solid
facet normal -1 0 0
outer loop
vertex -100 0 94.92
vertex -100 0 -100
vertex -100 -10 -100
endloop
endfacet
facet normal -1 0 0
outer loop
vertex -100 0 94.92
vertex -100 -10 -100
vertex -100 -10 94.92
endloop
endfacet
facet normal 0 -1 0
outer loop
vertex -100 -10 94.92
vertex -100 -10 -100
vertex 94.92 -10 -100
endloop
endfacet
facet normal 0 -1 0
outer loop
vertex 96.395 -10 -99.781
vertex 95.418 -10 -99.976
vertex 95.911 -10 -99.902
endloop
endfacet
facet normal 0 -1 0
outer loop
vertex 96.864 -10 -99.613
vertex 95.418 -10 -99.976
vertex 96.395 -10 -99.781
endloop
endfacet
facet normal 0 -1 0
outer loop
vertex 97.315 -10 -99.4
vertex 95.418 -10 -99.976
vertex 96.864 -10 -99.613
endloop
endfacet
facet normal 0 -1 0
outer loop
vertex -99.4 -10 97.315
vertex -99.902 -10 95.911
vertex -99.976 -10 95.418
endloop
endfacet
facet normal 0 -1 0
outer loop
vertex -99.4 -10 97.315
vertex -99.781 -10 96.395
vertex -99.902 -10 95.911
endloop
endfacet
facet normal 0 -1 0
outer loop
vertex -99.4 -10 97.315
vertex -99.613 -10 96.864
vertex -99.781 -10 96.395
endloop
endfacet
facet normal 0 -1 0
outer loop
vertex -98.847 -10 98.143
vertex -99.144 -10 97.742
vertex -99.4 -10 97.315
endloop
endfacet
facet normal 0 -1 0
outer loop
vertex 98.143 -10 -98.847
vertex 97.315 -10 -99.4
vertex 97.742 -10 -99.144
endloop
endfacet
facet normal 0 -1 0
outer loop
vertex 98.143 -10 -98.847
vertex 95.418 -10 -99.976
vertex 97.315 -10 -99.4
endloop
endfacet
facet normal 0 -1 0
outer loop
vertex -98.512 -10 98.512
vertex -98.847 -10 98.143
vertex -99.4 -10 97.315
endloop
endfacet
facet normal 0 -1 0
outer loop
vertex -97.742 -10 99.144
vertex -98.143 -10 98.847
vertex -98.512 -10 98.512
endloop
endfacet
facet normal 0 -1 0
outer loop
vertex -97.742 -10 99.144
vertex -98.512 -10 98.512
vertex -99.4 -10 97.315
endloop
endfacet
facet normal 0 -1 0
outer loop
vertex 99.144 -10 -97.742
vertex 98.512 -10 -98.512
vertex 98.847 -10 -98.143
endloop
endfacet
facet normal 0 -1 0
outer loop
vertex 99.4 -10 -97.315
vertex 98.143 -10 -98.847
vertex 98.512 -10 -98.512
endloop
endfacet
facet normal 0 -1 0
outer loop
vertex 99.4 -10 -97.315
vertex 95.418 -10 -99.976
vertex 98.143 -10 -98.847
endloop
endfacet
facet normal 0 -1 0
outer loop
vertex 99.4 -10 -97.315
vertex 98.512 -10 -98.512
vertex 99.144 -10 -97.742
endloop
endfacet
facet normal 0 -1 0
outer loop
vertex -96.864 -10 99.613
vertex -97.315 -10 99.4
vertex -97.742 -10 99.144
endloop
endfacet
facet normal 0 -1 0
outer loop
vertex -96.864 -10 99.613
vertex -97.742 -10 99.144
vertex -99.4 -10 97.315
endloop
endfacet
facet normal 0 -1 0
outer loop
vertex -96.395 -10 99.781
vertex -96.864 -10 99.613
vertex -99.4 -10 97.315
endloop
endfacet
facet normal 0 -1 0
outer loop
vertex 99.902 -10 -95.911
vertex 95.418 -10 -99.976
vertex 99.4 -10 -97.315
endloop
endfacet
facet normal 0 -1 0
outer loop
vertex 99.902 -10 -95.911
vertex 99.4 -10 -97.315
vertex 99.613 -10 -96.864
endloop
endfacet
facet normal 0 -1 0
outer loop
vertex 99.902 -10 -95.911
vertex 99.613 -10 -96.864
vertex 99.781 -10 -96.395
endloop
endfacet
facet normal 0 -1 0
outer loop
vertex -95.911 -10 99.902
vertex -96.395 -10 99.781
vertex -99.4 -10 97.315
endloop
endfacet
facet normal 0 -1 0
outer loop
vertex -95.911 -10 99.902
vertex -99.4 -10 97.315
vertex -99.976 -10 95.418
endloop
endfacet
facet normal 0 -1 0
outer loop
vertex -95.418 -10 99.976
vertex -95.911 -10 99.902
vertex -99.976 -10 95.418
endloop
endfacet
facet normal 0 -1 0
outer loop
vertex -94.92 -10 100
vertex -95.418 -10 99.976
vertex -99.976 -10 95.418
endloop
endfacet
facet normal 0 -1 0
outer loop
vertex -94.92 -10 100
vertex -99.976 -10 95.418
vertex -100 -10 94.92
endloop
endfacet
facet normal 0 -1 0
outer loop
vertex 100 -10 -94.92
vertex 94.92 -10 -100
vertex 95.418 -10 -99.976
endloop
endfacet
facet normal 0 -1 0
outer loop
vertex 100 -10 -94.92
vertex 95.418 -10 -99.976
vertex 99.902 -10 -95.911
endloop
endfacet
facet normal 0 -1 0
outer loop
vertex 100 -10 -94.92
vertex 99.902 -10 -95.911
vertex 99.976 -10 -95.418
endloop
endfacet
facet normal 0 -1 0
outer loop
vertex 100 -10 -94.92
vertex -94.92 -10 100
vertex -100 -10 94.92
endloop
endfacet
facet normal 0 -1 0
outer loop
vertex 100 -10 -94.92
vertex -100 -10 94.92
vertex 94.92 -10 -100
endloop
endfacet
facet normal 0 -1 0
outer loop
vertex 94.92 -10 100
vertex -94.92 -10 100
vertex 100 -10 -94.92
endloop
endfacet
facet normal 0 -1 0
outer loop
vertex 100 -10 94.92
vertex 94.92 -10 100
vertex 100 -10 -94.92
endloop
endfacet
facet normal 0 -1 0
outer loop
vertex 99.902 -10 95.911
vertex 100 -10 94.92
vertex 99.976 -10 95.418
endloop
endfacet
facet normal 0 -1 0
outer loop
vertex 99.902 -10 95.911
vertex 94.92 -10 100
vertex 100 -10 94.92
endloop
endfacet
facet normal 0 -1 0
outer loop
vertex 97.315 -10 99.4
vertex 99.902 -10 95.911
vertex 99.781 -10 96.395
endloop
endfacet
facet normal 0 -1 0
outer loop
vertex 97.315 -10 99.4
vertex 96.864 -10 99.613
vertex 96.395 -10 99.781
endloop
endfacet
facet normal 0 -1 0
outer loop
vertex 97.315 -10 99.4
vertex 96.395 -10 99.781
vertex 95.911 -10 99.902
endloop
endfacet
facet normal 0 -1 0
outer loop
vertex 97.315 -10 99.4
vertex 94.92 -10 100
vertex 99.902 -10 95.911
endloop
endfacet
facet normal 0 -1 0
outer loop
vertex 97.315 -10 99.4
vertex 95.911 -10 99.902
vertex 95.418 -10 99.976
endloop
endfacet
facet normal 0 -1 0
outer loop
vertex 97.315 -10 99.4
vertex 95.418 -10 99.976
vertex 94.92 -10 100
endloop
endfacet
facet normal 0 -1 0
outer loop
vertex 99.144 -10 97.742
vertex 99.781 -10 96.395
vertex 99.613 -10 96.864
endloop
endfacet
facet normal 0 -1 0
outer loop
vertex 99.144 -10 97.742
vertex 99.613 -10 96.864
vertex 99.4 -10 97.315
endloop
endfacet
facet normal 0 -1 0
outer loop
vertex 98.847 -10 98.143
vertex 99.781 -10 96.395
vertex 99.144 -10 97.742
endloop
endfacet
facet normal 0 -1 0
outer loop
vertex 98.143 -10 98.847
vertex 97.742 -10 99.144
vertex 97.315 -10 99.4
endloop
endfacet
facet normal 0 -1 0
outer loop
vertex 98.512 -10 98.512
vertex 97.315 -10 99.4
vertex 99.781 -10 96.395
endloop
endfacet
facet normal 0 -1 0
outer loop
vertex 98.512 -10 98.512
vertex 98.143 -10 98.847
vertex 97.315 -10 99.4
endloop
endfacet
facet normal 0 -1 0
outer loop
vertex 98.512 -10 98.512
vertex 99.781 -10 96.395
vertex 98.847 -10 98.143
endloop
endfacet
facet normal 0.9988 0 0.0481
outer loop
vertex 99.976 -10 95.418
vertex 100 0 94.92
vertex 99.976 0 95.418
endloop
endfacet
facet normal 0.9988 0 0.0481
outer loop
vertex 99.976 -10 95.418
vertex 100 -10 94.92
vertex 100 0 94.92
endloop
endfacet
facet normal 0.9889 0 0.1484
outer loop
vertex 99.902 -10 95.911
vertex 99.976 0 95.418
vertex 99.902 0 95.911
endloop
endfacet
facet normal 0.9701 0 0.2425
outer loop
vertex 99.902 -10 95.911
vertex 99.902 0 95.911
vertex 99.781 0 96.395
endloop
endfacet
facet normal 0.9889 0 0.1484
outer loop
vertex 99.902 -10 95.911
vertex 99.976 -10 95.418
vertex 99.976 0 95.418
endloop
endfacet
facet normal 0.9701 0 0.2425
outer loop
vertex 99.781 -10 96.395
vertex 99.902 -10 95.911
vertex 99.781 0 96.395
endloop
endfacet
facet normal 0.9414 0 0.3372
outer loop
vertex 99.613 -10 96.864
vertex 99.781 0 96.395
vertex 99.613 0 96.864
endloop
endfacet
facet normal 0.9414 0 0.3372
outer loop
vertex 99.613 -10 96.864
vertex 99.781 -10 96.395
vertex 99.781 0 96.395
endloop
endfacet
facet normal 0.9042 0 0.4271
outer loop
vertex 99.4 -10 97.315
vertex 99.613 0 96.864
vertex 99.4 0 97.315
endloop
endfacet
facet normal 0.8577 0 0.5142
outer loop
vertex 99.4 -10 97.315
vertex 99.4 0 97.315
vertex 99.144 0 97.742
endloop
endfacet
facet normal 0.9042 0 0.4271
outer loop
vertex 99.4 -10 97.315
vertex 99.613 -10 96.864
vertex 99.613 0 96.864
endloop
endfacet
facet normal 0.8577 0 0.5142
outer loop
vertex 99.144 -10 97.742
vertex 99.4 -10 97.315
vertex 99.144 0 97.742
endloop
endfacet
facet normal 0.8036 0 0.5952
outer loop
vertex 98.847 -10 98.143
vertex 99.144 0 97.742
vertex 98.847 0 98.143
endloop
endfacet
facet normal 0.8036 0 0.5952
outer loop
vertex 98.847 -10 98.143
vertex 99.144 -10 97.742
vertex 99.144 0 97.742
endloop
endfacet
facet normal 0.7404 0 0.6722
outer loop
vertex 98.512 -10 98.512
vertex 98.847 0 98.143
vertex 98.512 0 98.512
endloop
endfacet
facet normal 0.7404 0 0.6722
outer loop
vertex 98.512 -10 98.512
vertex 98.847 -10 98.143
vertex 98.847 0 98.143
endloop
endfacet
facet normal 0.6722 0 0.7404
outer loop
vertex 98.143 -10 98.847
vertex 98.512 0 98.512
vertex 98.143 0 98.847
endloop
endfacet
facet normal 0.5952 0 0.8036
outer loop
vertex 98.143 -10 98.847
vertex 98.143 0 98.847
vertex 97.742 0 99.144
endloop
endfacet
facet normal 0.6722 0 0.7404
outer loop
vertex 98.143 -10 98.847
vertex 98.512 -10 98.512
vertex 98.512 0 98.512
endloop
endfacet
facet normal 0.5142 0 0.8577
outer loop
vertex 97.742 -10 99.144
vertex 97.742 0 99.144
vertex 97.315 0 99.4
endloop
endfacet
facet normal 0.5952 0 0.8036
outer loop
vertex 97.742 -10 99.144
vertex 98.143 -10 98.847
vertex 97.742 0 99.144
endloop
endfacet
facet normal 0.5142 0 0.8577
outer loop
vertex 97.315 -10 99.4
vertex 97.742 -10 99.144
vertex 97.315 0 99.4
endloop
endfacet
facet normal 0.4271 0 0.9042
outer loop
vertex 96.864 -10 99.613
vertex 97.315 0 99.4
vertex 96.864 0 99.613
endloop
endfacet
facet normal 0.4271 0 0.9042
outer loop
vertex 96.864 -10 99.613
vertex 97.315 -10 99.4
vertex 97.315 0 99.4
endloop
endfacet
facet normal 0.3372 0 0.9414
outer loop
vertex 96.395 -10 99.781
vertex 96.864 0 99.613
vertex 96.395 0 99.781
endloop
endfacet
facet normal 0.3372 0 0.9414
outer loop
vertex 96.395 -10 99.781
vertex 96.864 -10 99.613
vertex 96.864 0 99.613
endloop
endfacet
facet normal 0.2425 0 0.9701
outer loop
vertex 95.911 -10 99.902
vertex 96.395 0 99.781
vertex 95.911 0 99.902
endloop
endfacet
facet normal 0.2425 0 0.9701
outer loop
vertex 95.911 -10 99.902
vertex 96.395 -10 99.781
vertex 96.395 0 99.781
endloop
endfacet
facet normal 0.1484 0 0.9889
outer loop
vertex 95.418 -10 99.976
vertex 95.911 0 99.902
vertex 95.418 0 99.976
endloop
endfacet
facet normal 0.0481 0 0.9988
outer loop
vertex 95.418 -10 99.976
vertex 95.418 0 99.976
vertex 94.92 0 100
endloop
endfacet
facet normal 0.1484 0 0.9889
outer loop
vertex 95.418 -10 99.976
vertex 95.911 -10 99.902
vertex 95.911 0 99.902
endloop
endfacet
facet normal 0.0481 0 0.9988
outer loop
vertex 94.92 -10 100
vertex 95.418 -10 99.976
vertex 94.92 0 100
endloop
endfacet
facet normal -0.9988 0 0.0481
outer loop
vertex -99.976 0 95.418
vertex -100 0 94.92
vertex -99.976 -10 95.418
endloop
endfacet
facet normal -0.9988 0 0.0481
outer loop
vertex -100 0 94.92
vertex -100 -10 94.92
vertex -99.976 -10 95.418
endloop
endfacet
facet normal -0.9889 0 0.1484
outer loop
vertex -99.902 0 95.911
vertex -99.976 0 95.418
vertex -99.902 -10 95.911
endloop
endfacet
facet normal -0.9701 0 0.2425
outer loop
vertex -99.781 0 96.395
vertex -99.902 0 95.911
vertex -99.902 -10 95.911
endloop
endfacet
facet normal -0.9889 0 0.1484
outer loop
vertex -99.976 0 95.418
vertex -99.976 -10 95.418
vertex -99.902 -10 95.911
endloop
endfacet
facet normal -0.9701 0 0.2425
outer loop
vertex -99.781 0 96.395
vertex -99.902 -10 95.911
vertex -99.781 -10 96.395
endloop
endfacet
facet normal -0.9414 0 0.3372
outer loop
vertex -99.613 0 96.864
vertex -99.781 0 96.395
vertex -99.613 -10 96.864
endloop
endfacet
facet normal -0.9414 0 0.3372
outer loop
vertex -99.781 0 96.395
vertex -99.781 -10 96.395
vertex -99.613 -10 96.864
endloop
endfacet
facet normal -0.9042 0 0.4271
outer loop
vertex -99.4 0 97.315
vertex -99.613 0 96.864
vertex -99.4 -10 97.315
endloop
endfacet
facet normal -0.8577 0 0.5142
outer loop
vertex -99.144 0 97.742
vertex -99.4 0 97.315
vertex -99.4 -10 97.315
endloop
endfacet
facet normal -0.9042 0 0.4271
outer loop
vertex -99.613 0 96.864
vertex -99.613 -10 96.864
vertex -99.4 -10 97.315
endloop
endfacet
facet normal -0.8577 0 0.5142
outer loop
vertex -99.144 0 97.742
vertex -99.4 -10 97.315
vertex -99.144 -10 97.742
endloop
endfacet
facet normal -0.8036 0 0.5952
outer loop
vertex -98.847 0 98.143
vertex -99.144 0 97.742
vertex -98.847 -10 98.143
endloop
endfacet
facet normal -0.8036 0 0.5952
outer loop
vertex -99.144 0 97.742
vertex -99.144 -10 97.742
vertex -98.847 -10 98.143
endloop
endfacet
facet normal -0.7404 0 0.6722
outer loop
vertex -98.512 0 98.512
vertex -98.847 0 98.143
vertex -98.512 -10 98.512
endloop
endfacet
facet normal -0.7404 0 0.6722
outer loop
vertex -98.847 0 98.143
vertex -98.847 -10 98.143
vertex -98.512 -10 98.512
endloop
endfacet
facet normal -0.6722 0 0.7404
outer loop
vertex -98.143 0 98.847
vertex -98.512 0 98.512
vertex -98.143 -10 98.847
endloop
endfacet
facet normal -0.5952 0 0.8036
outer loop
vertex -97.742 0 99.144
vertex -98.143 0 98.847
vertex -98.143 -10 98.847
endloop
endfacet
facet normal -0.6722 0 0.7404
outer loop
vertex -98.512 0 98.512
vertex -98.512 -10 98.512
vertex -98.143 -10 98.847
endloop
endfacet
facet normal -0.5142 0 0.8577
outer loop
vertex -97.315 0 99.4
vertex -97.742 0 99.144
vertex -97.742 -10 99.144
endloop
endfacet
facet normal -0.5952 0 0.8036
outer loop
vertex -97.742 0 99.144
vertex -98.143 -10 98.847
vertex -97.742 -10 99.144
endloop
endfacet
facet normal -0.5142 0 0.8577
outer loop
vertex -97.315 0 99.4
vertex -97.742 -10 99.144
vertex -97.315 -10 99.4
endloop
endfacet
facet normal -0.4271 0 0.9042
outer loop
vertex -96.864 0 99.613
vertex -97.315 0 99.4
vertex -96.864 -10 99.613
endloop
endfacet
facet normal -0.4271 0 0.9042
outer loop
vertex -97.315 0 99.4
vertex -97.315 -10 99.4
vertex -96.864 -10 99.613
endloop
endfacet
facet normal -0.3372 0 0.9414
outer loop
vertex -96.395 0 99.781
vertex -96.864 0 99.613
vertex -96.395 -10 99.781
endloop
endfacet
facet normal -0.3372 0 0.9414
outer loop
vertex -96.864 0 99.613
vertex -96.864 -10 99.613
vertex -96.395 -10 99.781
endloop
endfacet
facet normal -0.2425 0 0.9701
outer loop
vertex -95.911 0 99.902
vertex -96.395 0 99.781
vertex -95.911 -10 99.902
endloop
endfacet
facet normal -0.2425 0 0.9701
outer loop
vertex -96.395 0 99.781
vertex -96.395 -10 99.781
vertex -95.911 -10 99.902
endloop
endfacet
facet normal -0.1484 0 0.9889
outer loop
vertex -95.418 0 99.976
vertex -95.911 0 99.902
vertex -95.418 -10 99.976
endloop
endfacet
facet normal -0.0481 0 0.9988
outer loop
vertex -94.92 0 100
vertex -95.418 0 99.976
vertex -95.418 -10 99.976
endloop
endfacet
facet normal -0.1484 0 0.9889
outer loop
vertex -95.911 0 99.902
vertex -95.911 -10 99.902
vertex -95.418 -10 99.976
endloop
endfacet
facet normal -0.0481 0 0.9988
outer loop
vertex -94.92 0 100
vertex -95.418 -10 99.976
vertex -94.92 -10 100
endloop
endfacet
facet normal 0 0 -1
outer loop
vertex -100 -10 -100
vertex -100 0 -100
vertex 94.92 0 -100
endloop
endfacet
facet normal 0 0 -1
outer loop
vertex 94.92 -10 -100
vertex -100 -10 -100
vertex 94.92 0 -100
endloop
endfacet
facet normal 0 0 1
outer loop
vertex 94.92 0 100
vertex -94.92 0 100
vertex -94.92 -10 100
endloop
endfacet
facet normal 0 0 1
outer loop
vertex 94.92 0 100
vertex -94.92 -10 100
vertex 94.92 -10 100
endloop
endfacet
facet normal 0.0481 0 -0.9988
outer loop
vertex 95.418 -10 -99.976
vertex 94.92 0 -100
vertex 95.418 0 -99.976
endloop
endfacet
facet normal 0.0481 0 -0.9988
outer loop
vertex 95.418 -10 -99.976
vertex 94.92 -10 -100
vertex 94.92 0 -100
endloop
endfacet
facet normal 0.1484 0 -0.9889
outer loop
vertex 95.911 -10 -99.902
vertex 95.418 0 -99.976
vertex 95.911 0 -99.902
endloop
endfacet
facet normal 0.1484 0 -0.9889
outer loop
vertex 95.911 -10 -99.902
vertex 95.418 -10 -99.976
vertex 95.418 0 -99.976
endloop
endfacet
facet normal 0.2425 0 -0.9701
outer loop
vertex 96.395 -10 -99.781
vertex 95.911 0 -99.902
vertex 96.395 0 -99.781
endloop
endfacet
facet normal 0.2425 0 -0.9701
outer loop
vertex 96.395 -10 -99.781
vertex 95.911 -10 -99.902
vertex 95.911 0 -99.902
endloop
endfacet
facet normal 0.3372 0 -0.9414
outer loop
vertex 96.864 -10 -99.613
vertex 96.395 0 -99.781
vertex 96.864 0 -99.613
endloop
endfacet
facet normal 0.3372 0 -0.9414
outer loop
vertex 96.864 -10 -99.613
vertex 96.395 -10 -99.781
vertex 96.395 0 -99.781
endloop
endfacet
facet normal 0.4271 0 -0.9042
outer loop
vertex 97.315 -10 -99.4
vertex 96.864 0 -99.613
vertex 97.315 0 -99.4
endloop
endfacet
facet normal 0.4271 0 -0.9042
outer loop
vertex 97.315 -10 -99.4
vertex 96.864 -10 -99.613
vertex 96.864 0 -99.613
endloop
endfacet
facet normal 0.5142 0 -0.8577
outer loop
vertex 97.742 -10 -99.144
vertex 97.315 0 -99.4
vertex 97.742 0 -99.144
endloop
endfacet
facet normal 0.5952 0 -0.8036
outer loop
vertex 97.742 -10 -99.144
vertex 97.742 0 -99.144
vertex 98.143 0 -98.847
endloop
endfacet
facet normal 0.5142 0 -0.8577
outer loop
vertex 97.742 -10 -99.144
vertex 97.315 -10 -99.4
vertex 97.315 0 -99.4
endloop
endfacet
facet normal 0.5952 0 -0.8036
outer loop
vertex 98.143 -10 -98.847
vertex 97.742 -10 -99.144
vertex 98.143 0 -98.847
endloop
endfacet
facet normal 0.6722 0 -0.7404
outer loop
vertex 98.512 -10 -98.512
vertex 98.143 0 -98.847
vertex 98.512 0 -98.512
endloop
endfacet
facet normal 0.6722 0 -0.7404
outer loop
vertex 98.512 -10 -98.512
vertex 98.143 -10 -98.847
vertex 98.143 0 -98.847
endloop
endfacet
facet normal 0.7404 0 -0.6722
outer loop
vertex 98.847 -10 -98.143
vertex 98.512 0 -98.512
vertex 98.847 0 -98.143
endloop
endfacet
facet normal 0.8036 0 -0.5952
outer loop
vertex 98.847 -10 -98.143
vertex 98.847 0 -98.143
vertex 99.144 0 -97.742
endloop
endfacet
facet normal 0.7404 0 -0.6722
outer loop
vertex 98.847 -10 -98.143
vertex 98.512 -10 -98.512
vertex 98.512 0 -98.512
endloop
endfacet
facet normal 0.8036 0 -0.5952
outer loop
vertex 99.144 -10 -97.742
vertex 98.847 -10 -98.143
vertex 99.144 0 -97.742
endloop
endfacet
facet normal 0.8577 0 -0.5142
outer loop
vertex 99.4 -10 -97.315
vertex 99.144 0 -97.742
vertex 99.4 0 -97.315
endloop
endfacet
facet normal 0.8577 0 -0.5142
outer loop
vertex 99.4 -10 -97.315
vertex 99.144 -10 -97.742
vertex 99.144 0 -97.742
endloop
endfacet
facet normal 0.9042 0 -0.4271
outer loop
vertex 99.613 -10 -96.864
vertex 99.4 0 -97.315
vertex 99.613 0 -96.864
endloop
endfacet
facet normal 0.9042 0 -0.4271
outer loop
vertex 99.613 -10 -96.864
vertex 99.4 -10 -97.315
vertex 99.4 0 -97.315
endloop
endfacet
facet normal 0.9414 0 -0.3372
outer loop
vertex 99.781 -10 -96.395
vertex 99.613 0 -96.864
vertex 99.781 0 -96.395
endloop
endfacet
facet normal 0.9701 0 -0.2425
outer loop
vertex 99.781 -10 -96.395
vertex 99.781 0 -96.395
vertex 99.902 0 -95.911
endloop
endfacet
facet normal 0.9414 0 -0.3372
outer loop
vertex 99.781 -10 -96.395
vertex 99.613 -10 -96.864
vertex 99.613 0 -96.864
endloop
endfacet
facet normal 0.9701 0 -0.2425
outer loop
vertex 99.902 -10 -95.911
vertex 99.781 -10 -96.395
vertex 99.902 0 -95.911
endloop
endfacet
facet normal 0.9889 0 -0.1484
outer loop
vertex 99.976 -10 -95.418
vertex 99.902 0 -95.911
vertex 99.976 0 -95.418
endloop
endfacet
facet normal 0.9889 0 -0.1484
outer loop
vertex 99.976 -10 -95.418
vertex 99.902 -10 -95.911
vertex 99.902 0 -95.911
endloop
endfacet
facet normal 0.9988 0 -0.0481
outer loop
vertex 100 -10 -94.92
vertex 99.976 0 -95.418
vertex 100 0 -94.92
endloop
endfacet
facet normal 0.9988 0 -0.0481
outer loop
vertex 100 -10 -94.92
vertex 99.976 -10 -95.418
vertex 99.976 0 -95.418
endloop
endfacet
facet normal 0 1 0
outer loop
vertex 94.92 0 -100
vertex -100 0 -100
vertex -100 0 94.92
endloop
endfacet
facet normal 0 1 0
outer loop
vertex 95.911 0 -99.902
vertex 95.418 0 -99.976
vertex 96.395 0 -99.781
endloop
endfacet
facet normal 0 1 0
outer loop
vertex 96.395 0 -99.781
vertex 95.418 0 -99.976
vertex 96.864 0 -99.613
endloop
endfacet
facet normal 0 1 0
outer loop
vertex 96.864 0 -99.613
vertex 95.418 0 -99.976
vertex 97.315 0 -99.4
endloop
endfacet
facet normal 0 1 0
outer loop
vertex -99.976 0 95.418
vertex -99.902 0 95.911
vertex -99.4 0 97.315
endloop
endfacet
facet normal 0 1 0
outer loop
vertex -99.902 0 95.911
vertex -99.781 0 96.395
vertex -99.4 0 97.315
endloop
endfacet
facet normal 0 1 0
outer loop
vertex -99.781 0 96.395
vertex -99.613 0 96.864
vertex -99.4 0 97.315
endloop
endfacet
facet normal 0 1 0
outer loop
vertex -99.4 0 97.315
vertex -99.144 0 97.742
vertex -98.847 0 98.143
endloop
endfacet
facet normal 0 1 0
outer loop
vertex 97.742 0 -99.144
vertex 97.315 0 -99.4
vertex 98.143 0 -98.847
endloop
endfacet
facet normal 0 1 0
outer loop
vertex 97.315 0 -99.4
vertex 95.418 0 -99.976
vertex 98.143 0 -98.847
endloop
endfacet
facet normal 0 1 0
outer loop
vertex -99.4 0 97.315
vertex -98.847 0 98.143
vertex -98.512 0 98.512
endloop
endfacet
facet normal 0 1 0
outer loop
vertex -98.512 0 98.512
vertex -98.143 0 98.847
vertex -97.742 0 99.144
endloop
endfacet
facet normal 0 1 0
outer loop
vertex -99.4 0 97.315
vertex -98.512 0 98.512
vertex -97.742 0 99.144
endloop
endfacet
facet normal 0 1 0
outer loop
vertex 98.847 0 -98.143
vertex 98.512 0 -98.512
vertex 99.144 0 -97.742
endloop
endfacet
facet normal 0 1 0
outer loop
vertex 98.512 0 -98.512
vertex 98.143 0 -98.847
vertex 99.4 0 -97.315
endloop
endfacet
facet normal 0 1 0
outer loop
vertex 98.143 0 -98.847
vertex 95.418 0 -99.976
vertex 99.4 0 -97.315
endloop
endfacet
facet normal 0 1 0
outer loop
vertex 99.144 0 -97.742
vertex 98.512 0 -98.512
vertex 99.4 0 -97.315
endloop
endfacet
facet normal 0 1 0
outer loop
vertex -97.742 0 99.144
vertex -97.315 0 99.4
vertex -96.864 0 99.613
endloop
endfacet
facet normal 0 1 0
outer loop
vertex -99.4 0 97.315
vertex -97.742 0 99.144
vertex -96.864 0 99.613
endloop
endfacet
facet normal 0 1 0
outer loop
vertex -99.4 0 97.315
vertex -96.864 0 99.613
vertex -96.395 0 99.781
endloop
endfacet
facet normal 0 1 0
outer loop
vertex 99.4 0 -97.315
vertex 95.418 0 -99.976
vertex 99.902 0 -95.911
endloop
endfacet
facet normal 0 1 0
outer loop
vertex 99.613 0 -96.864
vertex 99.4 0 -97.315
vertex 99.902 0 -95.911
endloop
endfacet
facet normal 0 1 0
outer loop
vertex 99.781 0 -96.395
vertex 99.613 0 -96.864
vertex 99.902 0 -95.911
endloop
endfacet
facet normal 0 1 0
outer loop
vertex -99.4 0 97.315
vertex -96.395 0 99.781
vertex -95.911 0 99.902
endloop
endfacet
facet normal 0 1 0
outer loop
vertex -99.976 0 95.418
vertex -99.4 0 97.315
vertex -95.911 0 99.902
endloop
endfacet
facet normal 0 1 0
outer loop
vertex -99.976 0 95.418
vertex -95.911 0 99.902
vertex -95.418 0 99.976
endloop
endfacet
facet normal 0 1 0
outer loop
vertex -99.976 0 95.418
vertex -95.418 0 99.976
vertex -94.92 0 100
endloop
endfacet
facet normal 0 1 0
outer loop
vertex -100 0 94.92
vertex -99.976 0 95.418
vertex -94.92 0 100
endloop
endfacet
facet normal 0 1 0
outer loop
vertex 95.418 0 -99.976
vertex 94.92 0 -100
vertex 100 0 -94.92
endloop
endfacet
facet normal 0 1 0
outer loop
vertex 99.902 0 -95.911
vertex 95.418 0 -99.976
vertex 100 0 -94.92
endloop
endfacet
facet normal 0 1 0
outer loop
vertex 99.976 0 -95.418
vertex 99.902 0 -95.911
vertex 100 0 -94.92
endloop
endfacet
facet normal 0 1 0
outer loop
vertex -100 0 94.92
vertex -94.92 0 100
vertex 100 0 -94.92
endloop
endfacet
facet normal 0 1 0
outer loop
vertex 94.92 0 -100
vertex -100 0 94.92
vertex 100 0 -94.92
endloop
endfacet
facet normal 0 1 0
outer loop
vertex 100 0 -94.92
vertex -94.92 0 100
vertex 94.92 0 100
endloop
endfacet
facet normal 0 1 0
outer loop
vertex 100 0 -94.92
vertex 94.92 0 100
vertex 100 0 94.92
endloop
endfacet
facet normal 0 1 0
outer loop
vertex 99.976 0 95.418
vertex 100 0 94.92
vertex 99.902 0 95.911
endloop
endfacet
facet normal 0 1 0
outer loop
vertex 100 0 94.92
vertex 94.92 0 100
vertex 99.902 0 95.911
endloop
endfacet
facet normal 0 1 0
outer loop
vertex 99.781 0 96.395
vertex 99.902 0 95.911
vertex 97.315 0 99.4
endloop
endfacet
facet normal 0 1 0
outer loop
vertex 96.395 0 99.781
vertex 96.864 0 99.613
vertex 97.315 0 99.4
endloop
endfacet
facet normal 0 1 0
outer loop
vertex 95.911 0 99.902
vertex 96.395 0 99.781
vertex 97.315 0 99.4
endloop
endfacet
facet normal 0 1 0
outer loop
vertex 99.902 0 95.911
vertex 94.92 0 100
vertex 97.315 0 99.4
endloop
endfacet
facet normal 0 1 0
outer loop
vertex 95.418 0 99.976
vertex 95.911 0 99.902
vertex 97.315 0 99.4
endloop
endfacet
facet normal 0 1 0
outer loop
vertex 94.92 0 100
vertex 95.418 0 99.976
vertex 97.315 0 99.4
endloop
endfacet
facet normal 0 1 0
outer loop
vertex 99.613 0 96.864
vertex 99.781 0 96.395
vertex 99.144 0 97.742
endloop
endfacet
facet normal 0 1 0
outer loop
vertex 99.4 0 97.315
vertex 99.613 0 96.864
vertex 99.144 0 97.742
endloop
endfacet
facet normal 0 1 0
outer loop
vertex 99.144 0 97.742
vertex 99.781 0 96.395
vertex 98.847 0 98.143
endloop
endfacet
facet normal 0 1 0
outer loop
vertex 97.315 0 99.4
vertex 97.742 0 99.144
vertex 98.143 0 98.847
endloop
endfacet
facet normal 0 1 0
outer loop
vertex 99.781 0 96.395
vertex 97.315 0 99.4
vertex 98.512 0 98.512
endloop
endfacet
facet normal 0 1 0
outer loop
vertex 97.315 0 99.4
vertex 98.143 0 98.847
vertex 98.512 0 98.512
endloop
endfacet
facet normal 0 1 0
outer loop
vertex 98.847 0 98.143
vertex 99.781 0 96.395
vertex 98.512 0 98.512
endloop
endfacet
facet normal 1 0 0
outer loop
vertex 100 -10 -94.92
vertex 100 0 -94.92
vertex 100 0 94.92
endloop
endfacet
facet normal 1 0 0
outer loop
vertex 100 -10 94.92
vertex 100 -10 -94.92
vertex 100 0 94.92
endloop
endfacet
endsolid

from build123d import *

# Parameters (mm, degrees)
F0_W     = 200
F0_H     = 200
F1_DEPTH = 10
F4_R     = 5.08


# Not quite as in the source:
# - the program builds the solid bodies; features that only make, move or delete a surface that nothing else refers to are left out


with BuildPart() as f1:
    # F0 (on Front) → F1 (new body)
    with BuildSketch(Plane.XZ):
        Rectangle(F0_W, F0_H)
    extrude(amount=F1_DEPTH)

    # F4
    f4_edges = [f1.edges().sort_by_distance(p)[0] for p in [
        (-100, -5, 100),
        (100, -5, -100),
        (100, -5, 100),
    ]]
    fillet(f4_edges, radius=F4_R)


solid = f1.part
